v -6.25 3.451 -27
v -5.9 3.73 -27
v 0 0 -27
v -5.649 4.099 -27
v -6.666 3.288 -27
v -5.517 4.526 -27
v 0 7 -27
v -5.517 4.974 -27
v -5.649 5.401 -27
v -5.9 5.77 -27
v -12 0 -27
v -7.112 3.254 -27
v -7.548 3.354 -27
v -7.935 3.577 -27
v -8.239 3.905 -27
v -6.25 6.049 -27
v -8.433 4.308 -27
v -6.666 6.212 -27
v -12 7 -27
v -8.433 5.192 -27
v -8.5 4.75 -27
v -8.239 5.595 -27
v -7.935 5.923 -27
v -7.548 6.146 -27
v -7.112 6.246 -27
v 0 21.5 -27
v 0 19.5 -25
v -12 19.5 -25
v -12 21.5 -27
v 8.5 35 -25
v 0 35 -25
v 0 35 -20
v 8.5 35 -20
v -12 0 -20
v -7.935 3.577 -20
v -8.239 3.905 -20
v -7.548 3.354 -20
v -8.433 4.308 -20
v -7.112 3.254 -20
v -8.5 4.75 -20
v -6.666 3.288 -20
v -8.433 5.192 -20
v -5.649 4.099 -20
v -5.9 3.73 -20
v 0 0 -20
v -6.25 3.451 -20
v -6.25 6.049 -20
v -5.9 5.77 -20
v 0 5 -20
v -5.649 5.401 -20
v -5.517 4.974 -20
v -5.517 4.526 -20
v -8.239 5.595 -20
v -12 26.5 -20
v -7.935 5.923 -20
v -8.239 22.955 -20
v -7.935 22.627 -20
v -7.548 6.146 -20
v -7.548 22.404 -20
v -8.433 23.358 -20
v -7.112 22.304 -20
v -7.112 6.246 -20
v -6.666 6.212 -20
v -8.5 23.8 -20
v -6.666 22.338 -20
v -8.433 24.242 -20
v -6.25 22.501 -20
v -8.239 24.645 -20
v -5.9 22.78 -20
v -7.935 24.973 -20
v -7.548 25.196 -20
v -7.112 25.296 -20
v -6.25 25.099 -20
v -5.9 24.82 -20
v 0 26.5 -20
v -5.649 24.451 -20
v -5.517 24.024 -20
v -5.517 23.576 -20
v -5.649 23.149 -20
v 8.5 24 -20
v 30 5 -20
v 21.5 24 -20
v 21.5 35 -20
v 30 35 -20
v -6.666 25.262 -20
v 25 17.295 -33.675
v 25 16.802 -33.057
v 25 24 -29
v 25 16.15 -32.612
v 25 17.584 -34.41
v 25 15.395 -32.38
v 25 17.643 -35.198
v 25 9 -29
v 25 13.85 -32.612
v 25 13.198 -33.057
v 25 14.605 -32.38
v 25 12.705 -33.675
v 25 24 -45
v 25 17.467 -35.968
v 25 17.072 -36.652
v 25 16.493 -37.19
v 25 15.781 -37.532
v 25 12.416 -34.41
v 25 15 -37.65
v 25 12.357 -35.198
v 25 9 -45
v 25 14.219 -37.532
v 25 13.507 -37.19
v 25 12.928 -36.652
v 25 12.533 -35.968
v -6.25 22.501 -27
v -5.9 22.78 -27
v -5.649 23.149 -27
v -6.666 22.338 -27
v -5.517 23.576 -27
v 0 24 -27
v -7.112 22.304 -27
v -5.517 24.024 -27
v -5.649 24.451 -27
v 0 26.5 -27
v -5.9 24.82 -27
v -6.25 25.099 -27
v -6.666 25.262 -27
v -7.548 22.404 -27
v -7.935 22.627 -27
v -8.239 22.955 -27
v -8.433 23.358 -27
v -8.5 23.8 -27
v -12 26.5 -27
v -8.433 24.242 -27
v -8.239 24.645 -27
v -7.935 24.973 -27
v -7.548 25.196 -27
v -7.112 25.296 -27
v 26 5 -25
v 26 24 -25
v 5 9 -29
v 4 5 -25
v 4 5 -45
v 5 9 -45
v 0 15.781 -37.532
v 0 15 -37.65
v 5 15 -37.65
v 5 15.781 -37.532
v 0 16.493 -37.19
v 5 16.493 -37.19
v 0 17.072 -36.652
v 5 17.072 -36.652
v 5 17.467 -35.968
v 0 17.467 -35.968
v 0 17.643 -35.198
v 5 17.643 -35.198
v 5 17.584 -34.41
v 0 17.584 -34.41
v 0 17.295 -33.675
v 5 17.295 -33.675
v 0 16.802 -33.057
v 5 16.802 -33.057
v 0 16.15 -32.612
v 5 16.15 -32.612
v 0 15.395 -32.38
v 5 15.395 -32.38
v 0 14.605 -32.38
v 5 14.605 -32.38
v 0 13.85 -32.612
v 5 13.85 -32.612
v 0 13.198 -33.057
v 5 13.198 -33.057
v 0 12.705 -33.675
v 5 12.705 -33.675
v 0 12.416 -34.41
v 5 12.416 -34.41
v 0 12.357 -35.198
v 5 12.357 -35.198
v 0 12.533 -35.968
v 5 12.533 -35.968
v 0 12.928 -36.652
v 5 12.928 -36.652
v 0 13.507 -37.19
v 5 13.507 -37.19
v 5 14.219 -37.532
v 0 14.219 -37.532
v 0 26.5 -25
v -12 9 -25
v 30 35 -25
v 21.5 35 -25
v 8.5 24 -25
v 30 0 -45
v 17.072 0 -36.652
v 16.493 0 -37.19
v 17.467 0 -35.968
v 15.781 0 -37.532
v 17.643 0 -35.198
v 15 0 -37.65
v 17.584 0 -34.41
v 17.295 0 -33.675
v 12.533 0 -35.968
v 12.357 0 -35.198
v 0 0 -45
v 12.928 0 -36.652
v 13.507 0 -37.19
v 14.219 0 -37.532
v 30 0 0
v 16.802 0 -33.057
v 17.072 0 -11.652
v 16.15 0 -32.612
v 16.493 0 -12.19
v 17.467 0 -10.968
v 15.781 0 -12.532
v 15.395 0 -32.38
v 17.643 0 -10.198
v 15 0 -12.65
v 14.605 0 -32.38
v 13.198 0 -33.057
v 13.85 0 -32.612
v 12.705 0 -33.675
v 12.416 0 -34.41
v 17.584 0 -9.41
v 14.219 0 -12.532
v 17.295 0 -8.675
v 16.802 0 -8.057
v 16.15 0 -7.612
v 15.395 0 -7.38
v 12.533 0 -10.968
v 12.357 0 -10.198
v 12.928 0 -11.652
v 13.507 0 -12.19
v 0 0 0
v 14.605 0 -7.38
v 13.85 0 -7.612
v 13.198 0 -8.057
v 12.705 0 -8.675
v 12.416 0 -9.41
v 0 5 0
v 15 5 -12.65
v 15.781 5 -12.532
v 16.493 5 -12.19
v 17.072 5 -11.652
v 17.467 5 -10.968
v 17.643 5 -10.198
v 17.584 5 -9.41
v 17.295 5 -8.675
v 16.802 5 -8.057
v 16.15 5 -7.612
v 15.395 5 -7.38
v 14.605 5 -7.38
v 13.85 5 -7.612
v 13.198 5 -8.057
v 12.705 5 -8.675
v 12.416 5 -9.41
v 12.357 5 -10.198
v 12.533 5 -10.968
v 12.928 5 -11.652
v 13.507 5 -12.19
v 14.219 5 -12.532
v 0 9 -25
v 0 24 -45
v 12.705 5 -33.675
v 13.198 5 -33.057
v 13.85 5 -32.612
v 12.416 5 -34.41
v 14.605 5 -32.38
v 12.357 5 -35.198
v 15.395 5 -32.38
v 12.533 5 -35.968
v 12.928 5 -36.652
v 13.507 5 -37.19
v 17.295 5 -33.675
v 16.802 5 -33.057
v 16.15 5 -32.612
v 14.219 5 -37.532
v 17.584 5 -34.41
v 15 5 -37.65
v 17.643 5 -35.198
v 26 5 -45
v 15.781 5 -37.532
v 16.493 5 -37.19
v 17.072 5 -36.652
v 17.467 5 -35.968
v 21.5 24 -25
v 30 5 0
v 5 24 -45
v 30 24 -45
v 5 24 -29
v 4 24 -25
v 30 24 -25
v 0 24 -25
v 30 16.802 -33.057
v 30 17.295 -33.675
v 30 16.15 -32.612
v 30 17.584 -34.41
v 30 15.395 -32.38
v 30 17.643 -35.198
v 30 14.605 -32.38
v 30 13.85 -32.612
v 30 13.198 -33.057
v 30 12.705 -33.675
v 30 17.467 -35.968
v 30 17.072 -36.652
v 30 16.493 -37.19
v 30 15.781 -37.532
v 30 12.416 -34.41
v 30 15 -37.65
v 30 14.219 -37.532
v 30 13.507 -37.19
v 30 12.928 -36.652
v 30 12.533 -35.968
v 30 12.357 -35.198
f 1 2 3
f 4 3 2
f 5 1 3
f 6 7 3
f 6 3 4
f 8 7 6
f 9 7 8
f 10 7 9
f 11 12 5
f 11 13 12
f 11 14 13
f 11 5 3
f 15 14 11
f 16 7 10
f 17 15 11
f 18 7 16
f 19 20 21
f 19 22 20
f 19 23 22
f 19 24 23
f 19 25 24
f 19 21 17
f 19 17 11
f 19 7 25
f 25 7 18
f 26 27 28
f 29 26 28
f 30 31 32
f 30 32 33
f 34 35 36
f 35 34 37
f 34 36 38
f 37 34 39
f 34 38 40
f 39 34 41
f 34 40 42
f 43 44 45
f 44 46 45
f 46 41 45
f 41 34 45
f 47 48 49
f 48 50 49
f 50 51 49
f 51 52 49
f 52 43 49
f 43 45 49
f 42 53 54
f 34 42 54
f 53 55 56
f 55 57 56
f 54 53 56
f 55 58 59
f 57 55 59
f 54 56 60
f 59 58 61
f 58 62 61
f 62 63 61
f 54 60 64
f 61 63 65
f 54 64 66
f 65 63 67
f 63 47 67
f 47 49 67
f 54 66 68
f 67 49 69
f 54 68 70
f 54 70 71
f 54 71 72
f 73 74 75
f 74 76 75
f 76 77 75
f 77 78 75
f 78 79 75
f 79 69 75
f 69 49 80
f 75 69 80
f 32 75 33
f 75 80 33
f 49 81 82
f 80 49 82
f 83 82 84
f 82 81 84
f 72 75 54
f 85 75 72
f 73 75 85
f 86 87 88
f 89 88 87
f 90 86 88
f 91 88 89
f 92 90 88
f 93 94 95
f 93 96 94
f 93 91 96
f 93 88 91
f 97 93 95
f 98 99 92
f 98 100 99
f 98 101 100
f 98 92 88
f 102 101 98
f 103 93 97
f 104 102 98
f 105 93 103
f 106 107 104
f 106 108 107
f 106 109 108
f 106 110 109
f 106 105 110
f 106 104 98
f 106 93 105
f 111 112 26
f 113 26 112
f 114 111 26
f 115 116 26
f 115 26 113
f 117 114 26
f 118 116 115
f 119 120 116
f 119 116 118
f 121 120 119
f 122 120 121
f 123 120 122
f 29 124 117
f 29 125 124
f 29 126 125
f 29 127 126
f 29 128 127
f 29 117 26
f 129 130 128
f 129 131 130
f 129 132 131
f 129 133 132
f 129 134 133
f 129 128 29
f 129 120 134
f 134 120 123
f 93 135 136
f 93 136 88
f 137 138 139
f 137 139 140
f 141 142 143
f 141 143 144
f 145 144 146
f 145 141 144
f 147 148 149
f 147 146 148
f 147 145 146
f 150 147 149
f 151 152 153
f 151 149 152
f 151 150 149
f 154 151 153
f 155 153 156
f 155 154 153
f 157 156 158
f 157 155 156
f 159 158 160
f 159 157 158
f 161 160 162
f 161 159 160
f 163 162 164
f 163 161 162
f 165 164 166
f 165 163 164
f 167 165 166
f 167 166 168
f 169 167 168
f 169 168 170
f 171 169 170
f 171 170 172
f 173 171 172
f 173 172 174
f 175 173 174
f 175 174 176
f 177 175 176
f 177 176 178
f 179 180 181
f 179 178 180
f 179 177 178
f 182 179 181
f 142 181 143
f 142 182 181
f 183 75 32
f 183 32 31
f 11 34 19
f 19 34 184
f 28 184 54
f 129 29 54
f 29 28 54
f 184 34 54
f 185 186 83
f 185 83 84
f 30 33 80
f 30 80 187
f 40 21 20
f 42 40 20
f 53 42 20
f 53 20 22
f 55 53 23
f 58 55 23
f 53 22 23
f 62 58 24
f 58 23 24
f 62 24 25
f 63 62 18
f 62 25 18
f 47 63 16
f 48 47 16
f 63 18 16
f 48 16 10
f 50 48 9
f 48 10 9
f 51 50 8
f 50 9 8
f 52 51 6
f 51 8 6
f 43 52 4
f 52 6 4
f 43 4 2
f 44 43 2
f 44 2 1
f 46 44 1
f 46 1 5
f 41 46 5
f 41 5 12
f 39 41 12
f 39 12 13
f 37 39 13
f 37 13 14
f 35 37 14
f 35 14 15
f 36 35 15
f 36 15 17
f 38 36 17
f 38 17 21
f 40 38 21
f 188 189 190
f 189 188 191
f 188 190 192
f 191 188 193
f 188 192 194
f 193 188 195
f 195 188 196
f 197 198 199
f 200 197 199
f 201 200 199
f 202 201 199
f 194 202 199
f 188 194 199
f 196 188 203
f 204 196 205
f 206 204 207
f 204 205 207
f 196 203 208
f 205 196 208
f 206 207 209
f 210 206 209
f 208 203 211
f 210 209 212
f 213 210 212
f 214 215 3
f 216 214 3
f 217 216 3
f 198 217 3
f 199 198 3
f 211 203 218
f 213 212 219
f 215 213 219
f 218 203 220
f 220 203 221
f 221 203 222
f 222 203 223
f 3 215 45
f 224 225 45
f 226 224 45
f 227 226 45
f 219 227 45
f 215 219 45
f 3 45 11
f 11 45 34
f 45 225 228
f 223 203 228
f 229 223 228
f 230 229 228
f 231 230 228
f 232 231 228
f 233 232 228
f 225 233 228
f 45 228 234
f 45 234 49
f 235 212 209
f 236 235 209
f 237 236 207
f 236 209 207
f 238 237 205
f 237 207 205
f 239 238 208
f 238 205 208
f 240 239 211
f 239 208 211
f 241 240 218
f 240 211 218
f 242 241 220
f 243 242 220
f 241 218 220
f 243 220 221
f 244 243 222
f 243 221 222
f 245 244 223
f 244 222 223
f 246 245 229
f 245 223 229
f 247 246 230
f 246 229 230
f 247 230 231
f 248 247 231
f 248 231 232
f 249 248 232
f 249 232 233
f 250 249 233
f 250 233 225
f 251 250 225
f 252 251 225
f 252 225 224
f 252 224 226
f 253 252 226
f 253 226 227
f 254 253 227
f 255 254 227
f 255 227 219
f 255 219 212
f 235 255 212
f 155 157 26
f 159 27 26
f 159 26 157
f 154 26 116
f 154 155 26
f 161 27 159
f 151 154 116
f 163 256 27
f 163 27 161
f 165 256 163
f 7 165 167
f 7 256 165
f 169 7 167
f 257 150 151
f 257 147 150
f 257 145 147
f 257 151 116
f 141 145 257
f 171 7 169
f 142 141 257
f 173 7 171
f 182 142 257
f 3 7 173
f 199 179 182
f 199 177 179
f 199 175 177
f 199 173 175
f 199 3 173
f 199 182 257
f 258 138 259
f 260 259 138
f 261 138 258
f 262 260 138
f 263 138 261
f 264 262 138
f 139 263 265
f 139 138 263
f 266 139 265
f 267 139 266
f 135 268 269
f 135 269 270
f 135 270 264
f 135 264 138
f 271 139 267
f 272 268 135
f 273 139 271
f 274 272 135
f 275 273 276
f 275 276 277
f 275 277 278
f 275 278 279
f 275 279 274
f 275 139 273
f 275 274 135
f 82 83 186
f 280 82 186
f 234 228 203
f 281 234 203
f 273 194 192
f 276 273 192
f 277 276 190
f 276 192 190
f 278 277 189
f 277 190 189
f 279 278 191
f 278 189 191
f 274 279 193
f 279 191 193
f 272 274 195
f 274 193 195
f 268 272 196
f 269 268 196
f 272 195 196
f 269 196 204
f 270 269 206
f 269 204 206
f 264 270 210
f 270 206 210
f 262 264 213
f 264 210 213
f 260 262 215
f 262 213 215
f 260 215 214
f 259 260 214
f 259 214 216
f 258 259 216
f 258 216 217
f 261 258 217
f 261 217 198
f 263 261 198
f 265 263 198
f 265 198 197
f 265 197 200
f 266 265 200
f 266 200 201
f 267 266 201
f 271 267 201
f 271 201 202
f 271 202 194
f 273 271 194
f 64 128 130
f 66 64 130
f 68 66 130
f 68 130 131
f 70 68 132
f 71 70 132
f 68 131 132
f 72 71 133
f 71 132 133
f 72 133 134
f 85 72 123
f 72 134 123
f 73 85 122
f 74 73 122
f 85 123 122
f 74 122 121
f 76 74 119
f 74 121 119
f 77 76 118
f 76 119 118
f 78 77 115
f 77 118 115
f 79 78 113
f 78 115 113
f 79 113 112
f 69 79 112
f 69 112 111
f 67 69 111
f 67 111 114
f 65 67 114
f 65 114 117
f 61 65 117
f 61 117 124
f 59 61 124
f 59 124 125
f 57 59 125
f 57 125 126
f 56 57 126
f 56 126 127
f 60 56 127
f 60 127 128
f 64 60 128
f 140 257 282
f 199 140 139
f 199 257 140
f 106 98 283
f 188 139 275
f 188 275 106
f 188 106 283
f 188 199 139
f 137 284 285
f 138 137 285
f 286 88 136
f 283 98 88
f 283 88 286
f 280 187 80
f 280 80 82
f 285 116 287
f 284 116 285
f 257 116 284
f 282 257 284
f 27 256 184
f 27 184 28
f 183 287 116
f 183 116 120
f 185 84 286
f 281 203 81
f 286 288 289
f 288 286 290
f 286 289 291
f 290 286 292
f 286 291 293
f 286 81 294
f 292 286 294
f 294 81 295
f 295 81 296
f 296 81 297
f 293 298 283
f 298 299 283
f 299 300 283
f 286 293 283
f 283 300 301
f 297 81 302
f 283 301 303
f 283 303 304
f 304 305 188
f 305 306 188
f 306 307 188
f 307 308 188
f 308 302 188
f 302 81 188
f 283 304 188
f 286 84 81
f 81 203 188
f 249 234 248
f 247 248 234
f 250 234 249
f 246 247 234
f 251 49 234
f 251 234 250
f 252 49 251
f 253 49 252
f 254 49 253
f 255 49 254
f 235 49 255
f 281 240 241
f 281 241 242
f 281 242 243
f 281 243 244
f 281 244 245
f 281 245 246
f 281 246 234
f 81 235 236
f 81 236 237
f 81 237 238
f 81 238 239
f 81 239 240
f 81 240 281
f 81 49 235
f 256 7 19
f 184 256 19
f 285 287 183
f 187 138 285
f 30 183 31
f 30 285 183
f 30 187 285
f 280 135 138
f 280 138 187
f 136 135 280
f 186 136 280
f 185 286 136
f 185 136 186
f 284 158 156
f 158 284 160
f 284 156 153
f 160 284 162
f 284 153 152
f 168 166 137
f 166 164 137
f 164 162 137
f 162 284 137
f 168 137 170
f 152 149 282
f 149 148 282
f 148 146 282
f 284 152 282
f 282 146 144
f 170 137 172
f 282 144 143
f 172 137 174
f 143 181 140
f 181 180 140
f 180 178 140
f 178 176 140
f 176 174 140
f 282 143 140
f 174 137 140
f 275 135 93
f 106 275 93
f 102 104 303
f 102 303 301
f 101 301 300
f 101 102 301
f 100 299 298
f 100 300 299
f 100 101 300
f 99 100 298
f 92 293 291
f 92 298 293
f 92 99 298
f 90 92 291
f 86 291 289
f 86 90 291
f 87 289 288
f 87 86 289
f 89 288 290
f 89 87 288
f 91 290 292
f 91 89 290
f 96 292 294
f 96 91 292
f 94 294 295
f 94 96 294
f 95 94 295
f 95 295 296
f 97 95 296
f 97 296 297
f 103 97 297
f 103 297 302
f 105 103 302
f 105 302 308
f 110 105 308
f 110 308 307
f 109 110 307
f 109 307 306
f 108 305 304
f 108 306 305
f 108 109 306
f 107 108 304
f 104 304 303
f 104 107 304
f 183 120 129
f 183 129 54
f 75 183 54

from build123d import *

# Parameters (mm, degrees)
SKETCH1_W               = 30
SKETCH1_H               = 45
BOSS_EXTRUDE1_DEPTH     = 5
SKETCH2_W               = 30
SKETCH2_H               = 5
BOSS_EXTRUDE2_DEPTH     = 30
SKETCH3_W               = 5
SKETCH3_H               = 20
BOSS_EXTRUDE3_DEPTH     = 19
SKETCH4_W               = 13
SKETCH4_H               = 5
CUT_EXTRUDE1_DEPTH      = 11
SKETCH5_R               = 2.65
CUT_EXTRUDE2_DEPTH      = 10
CUT_EXTRUDE3_DEPTH      = 65.420493634
CUT_EXTRUDE3_DEPTH_BACK = 65.420493634
SKETCH6_R               = 2.65
CUT_EXTRUDE4_DEPTH      = 20
CUT_EXTRUDE5_REACH      = 61.169
SKETCH9_W               = 5
SKETCH9_H               = 26.5
BOSS_EXTRUDE4_DEPTH     = 12
SKETCH10_W              = 12
SKETCH10_H              = 9
SKETCH10_H_2            = 7
BOSS_EXTRUDE5_DEPTH     = 2
CHAMFER1_SIZE           = 2
CHAMFER2_SIZE           = 2
SKETCH11_R              = 1.5
CUT_EXTRUDE6_DEPTH      = 54.422841557


with BuildPart() as part:
    # Sketch1 → Boss-Extrude1 (new body)
    with BuildSketch(Plane(origin=(0, 0, 0), x_dir=(1, 0, 0), z_dir=(0, 1, 0))):
        with Locations((15, 22.5)):
            Rectangle(SKETCH1_W, SKETCH1_H)
    extrude(amount=BOSS_EXTRUDE1_DEPTH)

    # Sketch2 → Boss-Extrude2 (add)
    with BuildSketch(Plane(origin=(0, 5, 0), x_dir=(1, 0, 0), z_dir=(0, 1, 0))):
        with Locations((15, 22.5)):
            Rectangle(SKETCH2_W, SKETCH2_H)
    extrude(amount=BOSS_EXTRUDE2_DEPTH)

    # Sketch3 → Boss-Extrude3 (add)
    with BuildSketch(Plane(origin=(0, 5, 0), x_dir=(1, 0, 0), z_dir=(0, 1, 0))):
        with Locations((2.5, 35)):
            Rectangle(SKETCH3_W, SKETCH3_H)
        with Locations((27.5, 35)):
            Rectangle(SKETCH3_W, SKETCH3_H)
    extrude(amount=BOSS_EXTRUDE3_DEPTH)

    # Sketch4 → Cut-Extrude1 (cut)
    with BuildSketch(Plane(origin=(0, 35, 0), x_dir=(1, 0, 0), z_dir=(0, 1, 0))):
        with Locations((15, 22.5)):
            Rectangle(SKETCH4_W, SKETCH4_H)
    extrude(amount=-CUT_EXTRUDE1_DEPTH, mode=Mode.SUBTRACT)

    # Sketch5 → Cut-Extrude2 (cut)
    with BuildSketch(Plane.XZ):
        with Locations(Location((15, -10, 0), (0, 0, 270))):
            Circle(SKETCH5_R)
        with Locations(Location((15, -35, 0), (0, 0, 270))):
            Circle(SKETCH5_R)
    extrude(amount=-CUT_EXTRUDE2_DEPTH, mode=Mode.SUBTRACT)

    # Sketch6 → Cut-Extrude3 (cut, two sides: drawn at the far end of the back side and taken through both)
    with BuildSketch(Plane(origin=(30, 0, 0), x_dir=(0, 0, -1), z_dir=(1, 0, 0)).offset(-CUT_EXTRUDE3_DEPTH_BACK)):
        with Locations((35, 15)):
            Circle(SKETCH6_R)
    extrude(amount=CUT_EXTRUDE3_DEPTH + CUT_EXTRUDE3_DEPTH_BACK, mode=Mode.SUBTRACT)

    # Sketch7 → Cut-Extrude4 (cut)
    with BuildSketch(Plane(origin=(0, 0, -45), x_dir=(-1, 0, 0), z_dir=(0, 0, -1))):
        Polygon((-25, 5), (-26, 5), (-25, 9), align=None)
        Polygon((-5, 5), (-4, 5), (-5, 9), align=None)
    extrude(amount=-CUT_EXTRUDE4_DEPTH, mode=Mode.SUBTRACT)

    # Cut-Extrude5: up to this face of the body (flat: up to its plane)
    cut_extrude5_end = Plane(part.part.faces().sort_by_distance((0.360555128, 5, -10))[0])
    # Sketch8 → Cut-Extrude5 (cut, up to the picked face)
    with BuildSketch(Plane(origin=(0, 24, 0), x_dir=(1, 0, 0), z_dir=(0, 1, 0)), mode=Mode.PRIVATE) as cut_extrude5_sk1:
        Polygon((25, 25), (26, 25), (25, 29), align=None)
    cut_extrude5_tool1 = split(extrude(cut_extrude5_sk1.sketch, amount=-CUT_EXTRUDE5_REACH, mode=Mode.PRIVATE), bisect_by=cut_extrude5_end, keep=Keep.BOTH, mode=Mode.PRIVATE)
    # Sketch8 → Cut-Extrude5 (cut, up to the picked face)
    with BuildSketch(Plane(origin=(0, 24, 0), x_dir=(1, 0, 0), z_dir=(0, 1, 0)), mode=Mode.PRIVATE) as cut_extrude5_sk2:
        Polygon((5, 25), (5, 29), (4, 25), align=None)
    cut_extrude5_tool2 = split(extrude(cut_extrude5_sk2.sketch, amount=-CUT_EXTRUDE5_REACH, mode=Mode.PRIVATE), bisect_by=cut_extrude5_end, keep=Keep.BOTH, mode=Mode.PRIVATE)
    add(cut_extrude5_tool1.solids().sort_by(Axis((25.333333, 24, -26.333333), (0, -1, 0)))[0], mode=Mode.SUBTRACT)
    add(cut_extrude5_tool2.solids().sort_by(Axis((4.666667, 24, -26.333333), (0, -1, 0)))[0], mode=Mode.SUBTRACT)

    # Sketch9 → Boss-Extrude4 (add)
    with BuildSketch(Plane.ZY):
        with Locations((-22.5, 13.25)):
            Rectangle(SKETCH9_W, SKETCH9_H)
    extrude(amount=BOSS_EXTRUDE4_DEPTH)

    # Sketch10 → Boss-Extrude5 (add)
    with BuildSketch(Plane(origin=(0, 0, -25), x_dir=(-1, 0, 0), z_dir=(0, 0, -1))):
        with Locations((6, 4.5)):
            Rectangle(SKETCH10_W, SKETCH10_H)
        with Locations((6, 23)):
            Rectangle(SKETCH10_W, SKETCH10_H_2)
    extrude(amount=BOSS_EXTRUDE5_DEPTH)

    # Chamfer1
    chamfer1_edges = [part.edges().sort_by_distance(p)[0] for p in [
        (-6, 19.5, -27),
    ]]
    chamfer(chamfer1_edges, length=CHAMFER1_SIZE - 0.0001)  # a hair under: the kernel refuses the full size

    # Chamfer2
    chamfer2_edges = [part.edges().sort_by_distance(p)[0] for p in [
        (-6, 9, -27),
    ]]
    chamfer(chamfer2_edges, length=CHAMFER2_SIZE - 0.0001)  # a hair under: the kernel refuses the full size

    # Sketch11 → Cut-Extrude6 (cut, through all)
    with BuildSketch(Plane(origin=(0, 0, -27), x_dir=(-1, 0, 0), z_dir=(0, 0, -1))):
        with Locations((7, 23.8)):
            Circle(SKETCH11_R)
        with Locations((7, 4.75)):
            Circle(SKETCH11_R)
    extrude(amount=-CUT_EXTRUDE6_DEPTH, mode=Mode.SUBTRACT)


solid = part.part
